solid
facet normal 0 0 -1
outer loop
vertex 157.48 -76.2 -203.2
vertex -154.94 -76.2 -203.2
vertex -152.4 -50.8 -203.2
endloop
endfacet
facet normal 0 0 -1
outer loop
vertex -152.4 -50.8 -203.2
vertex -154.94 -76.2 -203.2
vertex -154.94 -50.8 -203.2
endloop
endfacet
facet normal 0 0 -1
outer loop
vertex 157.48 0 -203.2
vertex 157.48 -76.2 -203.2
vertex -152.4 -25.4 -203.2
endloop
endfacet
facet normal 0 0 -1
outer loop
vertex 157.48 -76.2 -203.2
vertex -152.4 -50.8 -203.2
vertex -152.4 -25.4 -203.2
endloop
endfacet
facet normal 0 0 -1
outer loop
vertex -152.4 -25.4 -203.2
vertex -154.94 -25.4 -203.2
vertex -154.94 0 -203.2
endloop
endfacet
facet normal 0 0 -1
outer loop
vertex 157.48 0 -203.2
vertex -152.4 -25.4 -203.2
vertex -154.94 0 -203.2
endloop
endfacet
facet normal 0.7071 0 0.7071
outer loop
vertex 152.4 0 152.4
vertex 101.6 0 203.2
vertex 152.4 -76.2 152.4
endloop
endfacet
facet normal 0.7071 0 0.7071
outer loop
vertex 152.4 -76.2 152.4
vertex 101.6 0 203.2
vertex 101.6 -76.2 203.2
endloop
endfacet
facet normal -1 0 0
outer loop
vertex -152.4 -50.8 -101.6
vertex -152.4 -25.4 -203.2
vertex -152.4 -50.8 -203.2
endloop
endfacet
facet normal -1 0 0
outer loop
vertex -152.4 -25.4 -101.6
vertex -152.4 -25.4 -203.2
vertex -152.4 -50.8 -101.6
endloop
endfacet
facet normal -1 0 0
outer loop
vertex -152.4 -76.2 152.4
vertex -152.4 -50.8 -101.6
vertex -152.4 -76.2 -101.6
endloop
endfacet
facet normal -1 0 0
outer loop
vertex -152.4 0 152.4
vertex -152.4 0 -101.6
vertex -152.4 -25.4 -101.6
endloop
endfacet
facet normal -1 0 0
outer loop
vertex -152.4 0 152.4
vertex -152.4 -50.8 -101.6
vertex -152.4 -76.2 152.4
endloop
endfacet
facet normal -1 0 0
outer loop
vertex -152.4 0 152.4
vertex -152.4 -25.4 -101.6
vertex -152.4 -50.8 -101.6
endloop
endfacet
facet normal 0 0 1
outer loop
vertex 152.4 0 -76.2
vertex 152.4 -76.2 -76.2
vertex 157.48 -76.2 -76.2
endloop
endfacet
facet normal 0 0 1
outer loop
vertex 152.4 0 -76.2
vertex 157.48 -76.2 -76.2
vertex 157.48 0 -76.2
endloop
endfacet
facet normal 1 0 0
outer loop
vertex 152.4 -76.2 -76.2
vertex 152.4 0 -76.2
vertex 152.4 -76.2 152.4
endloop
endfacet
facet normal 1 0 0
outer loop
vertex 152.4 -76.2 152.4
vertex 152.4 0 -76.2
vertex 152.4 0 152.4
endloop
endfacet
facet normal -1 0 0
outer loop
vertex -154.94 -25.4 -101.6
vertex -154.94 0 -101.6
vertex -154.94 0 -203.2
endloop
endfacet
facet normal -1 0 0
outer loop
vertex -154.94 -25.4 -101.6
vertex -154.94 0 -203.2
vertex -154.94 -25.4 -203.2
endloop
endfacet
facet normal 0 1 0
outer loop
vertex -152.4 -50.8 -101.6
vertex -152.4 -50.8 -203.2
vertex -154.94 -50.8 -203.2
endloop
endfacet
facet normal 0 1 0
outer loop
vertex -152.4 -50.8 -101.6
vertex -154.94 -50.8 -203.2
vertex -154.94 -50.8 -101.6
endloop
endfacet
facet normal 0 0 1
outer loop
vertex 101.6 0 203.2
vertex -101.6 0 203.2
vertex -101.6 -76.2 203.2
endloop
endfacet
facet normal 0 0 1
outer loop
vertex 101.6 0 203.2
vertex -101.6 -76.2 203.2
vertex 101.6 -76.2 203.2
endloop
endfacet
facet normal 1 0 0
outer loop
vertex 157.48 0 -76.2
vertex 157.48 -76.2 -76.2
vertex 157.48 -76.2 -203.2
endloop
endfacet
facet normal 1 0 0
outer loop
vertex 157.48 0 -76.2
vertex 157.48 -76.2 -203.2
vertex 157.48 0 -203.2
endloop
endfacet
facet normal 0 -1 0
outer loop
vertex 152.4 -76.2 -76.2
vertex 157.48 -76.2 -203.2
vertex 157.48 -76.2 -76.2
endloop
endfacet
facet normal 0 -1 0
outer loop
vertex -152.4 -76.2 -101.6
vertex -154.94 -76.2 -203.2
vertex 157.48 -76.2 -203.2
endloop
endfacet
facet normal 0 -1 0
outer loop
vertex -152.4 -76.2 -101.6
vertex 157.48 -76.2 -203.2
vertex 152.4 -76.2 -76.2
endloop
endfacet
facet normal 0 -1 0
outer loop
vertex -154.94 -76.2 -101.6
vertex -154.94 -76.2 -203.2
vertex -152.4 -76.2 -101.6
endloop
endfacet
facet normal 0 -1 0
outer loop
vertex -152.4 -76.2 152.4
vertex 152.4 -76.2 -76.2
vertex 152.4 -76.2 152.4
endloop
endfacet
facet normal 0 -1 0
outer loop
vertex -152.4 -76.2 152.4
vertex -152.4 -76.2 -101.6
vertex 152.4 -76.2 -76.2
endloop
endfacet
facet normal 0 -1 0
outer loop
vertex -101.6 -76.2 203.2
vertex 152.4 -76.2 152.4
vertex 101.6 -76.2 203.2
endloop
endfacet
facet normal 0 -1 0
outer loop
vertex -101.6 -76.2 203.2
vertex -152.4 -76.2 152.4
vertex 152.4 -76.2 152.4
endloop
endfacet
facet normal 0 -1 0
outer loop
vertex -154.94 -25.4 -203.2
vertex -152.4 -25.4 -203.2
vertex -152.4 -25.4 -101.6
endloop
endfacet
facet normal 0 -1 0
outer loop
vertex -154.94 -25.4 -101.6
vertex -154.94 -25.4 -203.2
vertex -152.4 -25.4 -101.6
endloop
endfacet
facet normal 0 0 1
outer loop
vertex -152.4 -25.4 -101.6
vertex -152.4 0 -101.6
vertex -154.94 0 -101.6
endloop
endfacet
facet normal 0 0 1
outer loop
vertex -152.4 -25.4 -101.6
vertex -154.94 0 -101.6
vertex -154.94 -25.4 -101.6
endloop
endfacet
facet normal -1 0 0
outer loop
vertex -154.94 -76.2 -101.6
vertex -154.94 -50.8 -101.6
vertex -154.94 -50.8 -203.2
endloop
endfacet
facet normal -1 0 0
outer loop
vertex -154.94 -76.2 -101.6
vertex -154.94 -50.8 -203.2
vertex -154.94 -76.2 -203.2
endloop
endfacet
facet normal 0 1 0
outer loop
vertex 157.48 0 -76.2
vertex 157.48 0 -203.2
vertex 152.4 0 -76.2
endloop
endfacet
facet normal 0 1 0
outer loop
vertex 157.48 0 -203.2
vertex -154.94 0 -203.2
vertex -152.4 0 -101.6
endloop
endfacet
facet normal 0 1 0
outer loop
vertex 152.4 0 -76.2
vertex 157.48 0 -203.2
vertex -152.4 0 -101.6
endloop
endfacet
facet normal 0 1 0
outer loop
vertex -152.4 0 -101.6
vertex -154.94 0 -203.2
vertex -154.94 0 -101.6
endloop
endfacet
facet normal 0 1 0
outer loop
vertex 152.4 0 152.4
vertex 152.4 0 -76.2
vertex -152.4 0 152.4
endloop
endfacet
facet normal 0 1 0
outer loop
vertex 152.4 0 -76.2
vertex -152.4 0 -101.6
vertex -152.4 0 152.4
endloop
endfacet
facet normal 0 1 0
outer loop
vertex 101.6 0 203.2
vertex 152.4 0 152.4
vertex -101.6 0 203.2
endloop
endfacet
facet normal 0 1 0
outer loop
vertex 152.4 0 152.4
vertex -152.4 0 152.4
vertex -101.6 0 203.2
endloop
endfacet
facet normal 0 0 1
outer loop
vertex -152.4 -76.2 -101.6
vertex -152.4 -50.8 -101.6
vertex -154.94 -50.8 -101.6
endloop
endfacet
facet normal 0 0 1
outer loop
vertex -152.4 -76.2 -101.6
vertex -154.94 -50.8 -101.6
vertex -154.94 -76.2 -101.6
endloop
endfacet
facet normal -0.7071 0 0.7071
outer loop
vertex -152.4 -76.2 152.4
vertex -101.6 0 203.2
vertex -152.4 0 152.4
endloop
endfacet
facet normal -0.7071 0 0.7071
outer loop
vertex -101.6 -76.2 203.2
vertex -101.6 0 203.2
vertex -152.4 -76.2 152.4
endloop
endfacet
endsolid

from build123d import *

# Parameters (mm, degrees)
F0_W     = 304.8
F0_H     = 406.4
F1_DEPTH = 76.2
F2_SIZE  = 50.8
F3_W     = 25.4
F3_H     = 101.6
F4_DEPTH = 2.54
F5_W     = 76.2
F5_H     = 127
F6_DEPTH = 5.08


with BuildPart() as f1:
    # F0 (on Front) → F1 (new body)
    with BuildSketch(Plane.XZ):
        Rectangle(F0_W, F0_H)
    extrude(amount=F1_DEPTH)

    # F2
    f2_edges = [f1.edges().sort_by_distance(p)[0] for p in [
        (-152.4, -38.1, 203.2),
        (152.4, -38.1, 203.2),
    ]]
    chamfer(f2_edges, length=F2_SIZE)

    # F3 (on face) → F4 (join)
    with BuildSketch(Plane(origin=(-152.4, 0, 0), x_dir=(0, -1, 0), z_dir=(-1, 0, 0))):
        with Locations((12.7, -152.4)):
            Rectangle(F3_W, F3_H)
        with Locations((63.5, -152.4)):
            Rectangle(F3_W, F3_H)
    extrude(amount=F4_DEPTH)

    # F5 (on face) → F6 (join)
    with BuildSketch(Plane.YZ.offset(152.4)):
        with Locations((-38.1, -139.7)):
            Rectangle(F5_W, F5_H)
    extrude(amount=F6_DEPTH)


solid = f1.part
